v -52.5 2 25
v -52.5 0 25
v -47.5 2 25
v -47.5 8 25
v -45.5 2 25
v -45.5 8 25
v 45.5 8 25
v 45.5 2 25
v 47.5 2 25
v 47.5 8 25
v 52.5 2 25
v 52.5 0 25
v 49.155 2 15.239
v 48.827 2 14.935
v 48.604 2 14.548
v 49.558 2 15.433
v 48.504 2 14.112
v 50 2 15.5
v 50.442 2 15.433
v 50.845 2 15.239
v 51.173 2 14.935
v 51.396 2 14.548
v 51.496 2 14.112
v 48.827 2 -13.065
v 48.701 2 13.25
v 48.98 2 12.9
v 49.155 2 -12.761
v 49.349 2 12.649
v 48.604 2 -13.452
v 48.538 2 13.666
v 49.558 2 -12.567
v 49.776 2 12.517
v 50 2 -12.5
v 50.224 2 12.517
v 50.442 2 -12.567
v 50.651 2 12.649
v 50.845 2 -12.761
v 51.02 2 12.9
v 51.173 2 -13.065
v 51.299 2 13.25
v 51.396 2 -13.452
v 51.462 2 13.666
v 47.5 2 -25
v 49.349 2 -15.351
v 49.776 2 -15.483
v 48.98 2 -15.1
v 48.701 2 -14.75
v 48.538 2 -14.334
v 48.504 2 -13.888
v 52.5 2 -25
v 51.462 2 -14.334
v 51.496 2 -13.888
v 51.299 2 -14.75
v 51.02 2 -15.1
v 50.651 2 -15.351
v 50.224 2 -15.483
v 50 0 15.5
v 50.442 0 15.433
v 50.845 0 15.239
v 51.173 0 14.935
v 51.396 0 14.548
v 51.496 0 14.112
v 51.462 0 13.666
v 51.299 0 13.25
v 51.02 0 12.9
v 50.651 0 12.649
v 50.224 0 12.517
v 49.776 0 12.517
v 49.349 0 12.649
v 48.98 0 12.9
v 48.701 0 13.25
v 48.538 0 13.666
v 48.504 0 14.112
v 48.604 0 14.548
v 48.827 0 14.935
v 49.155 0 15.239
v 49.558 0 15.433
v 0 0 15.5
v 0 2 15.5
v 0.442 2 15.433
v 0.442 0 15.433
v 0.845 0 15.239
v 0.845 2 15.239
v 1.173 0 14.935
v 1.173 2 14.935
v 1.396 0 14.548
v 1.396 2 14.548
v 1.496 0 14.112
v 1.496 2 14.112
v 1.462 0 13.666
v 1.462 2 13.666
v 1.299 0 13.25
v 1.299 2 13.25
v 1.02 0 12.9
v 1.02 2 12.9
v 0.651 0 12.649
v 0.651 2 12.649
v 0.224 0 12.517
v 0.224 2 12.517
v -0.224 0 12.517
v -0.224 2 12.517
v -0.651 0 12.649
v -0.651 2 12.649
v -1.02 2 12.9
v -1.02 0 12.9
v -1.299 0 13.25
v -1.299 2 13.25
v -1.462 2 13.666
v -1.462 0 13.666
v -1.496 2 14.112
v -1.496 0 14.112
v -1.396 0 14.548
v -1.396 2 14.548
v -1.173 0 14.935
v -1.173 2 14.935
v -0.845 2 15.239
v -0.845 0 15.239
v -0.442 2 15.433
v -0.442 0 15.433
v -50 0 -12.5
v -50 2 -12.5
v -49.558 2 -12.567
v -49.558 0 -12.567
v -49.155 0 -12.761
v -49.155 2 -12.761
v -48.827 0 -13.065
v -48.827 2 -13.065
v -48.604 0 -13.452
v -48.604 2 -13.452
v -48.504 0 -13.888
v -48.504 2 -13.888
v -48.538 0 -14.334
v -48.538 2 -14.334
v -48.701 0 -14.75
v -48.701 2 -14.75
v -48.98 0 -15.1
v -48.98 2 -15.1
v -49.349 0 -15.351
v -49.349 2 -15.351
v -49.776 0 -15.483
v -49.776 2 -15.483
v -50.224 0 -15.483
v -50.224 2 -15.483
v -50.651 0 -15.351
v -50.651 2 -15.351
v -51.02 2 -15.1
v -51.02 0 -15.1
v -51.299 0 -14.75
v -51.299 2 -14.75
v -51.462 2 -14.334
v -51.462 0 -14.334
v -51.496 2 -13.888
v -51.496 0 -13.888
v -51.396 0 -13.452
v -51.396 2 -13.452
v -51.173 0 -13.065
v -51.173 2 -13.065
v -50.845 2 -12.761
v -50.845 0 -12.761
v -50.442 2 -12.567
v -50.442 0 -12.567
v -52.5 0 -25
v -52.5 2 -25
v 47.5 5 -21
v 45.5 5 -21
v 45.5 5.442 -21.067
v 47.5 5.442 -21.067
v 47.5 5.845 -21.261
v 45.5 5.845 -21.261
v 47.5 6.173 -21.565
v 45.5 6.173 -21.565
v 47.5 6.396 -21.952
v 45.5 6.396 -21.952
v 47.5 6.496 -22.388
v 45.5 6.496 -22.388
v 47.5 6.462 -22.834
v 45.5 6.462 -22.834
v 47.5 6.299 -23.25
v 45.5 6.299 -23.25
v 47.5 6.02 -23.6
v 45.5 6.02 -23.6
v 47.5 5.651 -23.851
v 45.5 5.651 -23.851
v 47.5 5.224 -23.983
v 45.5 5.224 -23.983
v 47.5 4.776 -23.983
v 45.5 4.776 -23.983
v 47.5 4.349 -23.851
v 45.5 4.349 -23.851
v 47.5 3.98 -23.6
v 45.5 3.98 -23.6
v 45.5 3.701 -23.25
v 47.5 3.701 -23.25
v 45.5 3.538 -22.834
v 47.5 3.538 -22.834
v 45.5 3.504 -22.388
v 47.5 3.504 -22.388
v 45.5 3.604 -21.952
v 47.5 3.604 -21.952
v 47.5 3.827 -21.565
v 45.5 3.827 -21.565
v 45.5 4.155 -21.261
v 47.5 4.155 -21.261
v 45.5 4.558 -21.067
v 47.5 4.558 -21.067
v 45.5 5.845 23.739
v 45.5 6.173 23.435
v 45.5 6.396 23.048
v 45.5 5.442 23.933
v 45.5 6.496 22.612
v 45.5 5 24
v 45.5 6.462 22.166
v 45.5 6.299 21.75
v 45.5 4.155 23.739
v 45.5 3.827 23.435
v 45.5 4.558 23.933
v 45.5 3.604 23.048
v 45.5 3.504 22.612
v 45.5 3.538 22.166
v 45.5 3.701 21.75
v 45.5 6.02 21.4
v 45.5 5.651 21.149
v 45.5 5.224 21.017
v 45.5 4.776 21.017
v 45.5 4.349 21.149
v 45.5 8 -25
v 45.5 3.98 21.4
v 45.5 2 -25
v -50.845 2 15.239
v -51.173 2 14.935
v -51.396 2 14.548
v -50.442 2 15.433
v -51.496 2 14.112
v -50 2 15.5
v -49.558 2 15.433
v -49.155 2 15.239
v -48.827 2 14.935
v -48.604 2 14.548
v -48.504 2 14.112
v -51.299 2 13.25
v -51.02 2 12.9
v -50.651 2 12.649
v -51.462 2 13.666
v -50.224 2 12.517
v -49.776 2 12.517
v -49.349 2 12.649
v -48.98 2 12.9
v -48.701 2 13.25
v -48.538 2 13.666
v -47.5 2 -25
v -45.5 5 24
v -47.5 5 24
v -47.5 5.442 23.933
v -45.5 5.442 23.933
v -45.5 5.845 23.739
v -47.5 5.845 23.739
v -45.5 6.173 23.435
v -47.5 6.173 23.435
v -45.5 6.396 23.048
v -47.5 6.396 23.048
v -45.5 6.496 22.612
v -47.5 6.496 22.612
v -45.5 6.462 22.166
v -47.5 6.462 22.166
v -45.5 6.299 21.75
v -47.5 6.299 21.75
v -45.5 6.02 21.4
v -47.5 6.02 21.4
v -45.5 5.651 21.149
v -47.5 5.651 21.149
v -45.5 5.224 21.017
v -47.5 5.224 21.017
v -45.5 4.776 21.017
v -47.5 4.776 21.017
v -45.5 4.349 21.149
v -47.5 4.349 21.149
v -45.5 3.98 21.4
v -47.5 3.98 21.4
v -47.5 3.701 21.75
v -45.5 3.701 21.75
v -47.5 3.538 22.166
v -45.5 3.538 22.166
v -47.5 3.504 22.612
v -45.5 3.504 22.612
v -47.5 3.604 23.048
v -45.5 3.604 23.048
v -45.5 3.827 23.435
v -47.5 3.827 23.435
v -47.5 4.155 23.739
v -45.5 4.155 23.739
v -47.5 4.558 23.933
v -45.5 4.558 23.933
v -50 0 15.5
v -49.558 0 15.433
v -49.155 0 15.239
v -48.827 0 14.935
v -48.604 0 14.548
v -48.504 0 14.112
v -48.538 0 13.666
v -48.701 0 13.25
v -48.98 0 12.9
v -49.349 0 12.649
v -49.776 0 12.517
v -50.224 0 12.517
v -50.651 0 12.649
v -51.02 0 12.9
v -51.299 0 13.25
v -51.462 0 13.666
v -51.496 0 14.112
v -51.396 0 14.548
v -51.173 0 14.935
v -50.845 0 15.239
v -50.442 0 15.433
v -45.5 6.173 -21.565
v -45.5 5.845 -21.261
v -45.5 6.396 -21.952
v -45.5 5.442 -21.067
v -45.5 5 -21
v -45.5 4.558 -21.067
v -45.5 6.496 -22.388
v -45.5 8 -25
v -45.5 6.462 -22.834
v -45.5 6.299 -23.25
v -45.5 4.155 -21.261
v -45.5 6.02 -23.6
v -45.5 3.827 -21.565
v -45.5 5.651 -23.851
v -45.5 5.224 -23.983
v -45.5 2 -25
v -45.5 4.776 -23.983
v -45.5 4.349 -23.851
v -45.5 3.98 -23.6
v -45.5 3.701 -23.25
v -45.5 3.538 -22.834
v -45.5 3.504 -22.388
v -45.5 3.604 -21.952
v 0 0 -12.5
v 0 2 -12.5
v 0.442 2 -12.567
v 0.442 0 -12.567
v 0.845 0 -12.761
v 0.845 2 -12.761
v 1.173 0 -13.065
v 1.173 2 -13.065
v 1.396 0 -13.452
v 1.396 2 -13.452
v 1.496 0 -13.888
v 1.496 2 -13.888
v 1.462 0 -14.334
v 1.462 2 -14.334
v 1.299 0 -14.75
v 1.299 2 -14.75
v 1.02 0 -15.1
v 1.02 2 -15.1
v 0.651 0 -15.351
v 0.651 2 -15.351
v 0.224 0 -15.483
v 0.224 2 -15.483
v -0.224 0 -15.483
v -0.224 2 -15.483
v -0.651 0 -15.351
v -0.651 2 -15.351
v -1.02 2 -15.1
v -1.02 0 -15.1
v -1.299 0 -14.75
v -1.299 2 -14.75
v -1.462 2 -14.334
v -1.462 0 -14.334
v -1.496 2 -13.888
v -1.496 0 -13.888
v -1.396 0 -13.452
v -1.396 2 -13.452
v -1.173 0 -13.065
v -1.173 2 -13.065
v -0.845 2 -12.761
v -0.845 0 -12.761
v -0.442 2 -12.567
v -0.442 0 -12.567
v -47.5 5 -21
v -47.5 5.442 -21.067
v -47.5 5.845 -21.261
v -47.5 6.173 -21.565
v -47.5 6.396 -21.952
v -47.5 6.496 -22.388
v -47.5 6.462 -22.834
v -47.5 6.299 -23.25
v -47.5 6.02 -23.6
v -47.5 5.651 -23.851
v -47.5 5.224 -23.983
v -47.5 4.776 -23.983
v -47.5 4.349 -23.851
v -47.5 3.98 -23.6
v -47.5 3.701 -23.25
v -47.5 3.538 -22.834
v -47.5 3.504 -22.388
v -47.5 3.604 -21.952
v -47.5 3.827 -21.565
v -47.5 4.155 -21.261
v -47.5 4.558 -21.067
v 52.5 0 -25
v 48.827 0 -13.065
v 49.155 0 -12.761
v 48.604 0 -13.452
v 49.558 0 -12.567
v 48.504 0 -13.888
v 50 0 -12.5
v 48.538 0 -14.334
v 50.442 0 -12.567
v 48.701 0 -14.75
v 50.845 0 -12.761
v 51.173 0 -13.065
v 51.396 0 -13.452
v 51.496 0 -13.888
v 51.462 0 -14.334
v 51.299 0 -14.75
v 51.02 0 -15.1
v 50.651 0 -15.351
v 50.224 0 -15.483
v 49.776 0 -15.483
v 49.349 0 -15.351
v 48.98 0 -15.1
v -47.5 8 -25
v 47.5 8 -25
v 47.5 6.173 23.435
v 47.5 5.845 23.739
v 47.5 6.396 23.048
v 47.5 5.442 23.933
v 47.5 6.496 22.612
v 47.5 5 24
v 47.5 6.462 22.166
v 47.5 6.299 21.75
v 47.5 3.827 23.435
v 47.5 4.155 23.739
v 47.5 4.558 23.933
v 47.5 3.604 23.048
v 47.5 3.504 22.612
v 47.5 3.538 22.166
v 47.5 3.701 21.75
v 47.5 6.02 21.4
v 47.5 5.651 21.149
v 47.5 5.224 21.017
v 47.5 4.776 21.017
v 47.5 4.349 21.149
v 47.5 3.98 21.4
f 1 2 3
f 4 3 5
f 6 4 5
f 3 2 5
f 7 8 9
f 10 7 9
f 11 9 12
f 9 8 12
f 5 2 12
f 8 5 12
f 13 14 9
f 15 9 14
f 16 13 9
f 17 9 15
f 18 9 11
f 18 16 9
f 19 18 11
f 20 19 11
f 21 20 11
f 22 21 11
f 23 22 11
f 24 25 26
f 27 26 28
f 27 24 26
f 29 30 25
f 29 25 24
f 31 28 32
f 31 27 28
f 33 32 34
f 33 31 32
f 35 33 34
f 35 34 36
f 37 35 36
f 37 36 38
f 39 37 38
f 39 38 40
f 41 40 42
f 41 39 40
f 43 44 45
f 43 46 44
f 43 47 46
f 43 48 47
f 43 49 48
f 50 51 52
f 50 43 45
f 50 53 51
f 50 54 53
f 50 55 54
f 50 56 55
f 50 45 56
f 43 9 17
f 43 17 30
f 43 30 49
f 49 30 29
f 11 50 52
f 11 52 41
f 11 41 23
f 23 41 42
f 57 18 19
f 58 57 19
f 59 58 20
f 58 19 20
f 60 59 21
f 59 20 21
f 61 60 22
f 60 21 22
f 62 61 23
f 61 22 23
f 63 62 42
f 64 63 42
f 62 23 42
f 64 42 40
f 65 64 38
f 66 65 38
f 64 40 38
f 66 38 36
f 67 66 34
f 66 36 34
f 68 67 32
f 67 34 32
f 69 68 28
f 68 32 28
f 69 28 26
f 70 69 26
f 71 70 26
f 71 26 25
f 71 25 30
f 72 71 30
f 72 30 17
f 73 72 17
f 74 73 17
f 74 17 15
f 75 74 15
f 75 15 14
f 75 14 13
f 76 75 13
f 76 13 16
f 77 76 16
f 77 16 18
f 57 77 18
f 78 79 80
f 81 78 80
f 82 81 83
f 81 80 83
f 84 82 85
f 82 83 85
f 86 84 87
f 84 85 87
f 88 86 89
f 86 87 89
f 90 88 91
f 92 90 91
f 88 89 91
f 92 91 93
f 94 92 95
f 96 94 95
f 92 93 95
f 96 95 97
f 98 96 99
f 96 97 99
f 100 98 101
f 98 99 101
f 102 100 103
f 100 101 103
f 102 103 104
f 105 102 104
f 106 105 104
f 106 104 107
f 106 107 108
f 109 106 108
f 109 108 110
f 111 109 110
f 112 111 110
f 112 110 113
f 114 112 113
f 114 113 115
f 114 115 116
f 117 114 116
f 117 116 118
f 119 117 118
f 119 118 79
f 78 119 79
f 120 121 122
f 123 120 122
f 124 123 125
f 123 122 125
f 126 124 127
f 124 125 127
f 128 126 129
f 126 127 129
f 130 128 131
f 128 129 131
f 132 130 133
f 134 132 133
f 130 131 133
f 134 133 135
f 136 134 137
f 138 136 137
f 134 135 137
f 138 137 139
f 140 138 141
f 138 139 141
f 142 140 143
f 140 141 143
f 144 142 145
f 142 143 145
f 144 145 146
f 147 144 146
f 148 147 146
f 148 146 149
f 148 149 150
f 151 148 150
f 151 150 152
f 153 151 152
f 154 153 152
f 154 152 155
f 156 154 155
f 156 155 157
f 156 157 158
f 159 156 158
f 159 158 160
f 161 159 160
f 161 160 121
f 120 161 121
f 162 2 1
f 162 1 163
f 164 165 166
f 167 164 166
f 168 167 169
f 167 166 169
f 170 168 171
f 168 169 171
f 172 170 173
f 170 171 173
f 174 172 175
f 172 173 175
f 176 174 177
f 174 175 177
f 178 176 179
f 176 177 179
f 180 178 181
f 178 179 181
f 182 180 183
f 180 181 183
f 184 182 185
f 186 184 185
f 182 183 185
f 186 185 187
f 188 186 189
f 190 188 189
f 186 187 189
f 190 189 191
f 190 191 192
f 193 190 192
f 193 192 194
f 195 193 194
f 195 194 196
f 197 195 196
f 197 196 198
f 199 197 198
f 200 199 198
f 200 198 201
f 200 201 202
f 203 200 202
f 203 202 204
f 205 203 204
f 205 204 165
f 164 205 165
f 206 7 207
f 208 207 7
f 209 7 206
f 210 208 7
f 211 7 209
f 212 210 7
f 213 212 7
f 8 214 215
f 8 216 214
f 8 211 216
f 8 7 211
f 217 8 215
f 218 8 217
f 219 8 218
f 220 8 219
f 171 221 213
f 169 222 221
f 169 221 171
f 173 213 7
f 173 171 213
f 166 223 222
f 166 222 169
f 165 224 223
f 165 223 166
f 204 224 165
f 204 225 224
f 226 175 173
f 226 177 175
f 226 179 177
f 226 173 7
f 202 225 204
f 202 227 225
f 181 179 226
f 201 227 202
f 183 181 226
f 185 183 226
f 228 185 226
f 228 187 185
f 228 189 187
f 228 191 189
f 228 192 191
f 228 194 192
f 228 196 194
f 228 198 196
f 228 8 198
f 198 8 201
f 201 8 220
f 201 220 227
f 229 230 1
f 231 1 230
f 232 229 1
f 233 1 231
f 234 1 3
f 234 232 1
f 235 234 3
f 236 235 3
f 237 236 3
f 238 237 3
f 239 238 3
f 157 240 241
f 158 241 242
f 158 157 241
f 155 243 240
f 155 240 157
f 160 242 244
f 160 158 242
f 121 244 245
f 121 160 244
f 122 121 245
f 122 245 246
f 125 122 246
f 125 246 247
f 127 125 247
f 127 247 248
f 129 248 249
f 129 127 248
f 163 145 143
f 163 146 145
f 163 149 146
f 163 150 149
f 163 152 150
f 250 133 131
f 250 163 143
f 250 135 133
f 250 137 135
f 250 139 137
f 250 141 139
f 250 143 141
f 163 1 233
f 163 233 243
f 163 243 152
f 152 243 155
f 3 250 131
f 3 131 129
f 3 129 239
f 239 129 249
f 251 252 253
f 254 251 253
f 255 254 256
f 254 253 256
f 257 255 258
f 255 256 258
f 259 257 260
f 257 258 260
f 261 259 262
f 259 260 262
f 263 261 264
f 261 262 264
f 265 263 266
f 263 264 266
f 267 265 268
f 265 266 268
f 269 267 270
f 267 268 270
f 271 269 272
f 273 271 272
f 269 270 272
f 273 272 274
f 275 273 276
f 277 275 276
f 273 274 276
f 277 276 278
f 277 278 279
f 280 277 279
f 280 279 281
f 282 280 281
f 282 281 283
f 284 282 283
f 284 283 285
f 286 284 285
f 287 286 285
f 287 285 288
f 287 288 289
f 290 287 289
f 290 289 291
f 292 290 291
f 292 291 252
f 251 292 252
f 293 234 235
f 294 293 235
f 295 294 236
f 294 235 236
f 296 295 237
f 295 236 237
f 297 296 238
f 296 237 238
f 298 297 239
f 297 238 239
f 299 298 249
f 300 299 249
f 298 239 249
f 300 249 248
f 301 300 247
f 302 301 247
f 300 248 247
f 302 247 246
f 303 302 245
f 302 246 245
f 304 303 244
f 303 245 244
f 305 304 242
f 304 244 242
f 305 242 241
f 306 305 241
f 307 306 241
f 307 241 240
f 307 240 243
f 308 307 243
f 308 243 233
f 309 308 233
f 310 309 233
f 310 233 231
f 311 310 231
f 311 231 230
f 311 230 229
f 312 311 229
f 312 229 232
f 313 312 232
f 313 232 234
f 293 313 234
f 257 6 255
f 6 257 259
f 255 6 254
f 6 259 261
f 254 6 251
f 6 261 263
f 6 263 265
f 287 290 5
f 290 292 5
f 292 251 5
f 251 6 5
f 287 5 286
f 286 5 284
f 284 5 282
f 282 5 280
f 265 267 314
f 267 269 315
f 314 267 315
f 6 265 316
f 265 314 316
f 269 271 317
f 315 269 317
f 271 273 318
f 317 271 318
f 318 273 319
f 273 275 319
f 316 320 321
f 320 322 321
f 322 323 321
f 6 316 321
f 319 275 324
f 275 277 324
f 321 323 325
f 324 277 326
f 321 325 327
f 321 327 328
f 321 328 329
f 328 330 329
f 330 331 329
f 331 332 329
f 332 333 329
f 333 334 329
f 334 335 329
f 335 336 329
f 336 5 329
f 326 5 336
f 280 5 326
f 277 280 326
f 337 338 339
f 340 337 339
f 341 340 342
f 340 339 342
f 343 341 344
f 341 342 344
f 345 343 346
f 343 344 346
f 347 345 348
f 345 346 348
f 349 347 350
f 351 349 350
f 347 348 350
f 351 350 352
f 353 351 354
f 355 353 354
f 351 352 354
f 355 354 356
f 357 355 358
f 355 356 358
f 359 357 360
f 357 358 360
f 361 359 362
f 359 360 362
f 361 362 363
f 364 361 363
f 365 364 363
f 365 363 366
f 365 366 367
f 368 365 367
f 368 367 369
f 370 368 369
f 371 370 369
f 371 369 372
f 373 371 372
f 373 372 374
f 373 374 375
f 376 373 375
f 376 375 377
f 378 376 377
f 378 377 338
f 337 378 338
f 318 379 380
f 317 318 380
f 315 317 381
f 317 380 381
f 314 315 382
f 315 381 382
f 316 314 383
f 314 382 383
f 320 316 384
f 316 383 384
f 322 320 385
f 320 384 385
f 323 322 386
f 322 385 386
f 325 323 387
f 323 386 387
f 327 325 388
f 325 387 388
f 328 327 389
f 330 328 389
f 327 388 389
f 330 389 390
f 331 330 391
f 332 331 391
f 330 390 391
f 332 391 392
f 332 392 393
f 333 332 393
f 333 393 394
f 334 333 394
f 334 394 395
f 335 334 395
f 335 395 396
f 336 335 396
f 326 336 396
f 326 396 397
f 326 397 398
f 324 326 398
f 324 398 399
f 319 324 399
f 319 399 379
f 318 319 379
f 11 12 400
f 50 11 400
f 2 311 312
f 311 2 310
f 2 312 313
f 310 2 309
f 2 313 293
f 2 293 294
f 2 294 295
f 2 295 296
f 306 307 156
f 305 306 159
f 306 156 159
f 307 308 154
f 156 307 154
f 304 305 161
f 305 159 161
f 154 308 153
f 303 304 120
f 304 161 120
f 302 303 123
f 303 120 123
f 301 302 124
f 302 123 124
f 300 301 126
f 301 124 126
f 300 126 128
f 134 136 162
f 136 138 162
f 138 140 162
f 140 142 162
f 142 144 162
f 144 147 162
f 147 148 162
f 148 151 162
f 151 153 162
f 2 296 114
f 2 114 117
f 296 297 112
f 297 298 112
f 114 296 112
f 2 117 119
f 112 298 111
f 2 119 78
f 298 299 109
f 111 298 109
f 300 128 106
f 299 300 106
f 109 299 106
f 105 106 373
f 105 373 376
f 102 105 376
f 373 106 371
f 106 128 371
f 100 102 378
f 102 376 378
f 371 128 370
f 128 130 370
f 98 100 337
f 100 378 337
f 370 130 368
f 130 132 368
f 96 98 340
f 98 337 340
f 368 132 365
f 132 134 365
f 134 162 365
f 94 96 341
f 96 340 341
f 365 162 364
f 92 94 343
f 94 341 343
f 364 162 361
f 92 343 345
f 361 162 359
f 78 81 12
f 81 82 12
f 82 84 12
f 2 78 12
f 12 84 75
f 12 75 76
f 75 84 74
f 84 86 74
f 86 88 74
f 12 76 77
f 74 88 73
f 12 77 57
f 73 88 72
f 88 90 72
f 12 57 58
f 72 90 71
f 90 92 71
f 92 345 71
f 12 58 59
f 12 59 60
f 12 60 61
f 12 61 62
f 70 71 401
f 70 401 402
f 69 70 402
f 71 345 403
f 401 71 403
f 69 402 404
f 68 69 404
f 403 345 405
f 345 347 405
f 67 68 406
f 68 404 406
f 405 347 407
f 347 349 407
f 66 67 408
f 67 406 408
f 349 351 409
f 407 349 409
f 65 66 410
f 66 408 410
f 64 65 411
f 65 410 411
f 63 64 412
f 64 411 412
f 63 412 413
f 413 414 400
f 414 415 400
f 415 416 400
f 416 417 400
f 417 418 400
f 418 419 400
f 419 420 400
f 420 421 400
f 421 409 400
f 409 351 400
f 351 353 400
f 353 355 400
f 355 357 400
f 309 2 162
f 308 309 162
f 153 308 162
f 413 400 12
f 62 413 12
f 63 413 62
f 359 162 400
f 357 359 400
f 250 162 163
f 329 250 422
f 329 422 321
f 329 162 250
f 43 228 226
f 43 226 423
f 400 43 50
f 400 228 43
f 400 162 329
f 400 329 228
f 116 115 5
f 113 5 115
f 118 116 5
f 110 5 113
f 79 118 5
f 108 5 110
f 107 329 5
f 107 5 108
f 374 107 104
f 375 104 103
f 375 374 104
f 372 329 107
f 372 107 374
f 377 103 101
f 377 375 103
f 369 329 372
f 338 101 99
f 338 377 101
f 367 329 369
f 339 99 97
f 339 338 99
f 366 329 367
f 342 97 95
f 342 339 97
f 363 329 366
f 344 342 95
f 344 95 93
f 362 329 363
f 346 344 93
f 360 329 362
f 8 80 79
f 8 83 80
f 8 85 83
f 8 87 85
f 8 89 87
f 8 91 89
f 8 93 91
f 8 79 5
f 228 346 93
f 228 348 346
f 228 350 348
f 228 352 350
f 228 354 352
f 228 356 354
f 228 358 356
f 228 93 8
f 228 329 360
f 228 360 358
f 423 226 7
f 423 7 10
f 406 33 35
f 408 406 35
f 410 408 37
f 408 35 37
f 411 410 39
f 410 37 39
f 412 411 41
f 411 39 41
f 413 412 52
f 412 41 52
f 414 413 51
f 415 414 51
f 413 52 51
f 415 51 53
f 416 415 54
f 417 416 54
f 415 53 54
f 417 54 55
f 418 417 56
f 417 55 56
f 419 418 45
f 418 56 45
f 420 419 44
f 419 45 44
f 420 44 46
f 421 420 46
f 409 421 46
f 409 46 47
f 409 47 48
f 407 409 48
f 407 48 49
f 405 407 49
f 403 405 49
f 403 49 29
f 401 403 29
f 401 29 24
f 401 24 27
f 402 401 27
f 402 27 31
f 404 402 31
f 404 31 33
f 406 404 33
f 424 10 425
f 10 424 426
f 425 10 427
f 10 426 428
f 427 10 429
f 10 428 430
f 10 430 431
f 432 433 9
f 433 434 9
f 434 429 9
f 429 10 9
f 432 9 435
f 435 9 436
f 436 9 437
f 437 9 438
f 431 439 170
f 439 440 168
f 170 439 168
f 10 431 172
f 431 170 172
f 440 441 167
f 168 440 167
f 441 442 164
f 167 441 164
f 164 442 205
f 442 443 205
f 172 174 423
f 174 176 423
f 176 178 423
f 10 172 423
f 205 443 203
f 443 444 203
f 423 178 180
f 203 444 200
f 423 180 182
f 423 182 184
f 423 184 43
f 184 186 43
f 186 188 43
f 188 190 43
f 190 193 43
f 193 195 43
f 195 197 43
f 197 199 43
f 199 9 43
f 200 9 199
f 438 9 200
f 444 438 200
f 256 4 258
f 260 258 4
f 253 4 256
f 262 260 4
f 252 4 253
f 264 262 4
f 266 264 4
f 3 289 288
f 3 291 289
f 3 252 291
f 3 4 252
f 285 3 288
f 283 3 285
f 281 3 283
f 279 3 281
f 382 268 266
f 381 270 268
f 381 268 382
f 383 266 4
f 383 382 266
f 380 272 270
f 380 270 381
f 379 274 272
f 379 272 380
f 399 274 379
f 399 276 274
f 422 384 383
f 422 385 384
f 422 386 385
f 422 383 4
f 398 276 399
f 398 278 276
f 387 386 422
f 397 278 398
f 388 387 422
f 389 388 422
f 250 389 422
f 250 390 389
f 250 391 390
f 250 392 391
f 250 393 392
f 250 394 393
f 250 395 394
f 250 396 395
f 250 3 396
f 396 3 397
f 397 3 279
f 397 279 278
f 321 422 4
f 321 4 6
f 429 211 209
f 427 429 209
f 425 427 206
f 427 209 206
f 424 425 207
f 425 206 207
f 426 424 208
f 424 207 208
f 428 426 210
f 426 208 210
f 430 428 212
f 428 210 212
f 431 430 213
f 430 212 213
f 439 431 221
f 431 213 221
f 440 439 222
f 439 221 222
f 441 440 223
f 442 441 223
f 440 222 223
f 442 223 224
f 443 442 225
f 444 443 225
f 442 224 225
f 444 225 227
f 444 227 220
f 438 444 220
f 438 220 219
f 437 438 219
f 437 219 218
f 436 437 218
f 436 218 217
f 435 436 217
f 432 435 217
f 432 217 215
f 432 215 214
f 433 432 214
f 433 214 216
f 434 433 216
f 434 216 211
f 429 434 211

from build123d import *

# Parameters (mm, degrees)
SKETCH_1_W          = 105
SKETCH_1_H          = 50
EXTRUDE_1_DEPTH     = 2
SKETCH_6_W          = 2
SKETCH_6_H          = 50
EXTRUDE_3_DEPTH     = 6
SKETCH_7_R          = 1.5
CUT_EXTRUDE_3_DEPTH = 6
SKETCH_8_R          = 1.5
CUT_EXTRUDE_4_DEPTH = 100


with BuildPart() as part:
    # 草图1 → 凸台-拉伸1 (new body)
    with BuildSketch(Plane(origin=(0, 0, 0), x_dir=(1, 0, 0), z_dir=(0, 1, 0))):
        Rectangle(SKETCH_1_W, SKETCH_1_H)
    extrude(amount=EXTRUDE_1_DEPTH)

    # 草图6 → 凸台-拉伸3 (add)
    with BuildSketch(Plane(origin=(0, 2, 0), x_dir=(1, 0, 0), z_dir=(0, 1, 0))):
        with Locations((-46.5, 0)):
            Rectangle(SKETCH_6_W, SKETCH_6_H)
        with Locations((46.5, 0)):
            Rectangle(SKETCH_6_W, SKETCH_6_H)
    extrude(amount=EXTRUDE_3_DEPTH)

    # 草图7 → 切除-拉伸3 (cut)
    with BuildSketch(Plane(origin=(0, 2, 0), x_dir=(1, 0, 0), z_dir=(0, 1, 0))):
        with Locations(Location((-50, 14, 0), (0, 0, 270))):
            Circle(SKETCH_7_R)
        with Locations(Location((-50, -14, 0), (0, 0, 270))):
            Circle(SKETCH_7_R)
        with Locations(Location((50, 14, 0), (0, 0, 270))):
            Circle(SKETCH_7_R)
        with Locations(Location((50, -14, 0), (0, 0, 270))):
            Circle(SKETCH_7_R)
        with Locations(Location((0, 14, 0), (0, 0, 270))):
            Circle(SKETCH_7_R)
        with Locations(Location((0, -14, 0), (0, 0, 270))):
            Circle(SKETCH_7_R)
    extrude(amount=-CUT_EXTRUDE_3_DEPTH, mode=Mode.SUBTRACT)

    # 草图8 → 切除-拉伸4 (cut)
    with BuildSketch(Plane.ZY.offset(47.5)):
        with Locations((-22.5, 5)):
            Circle(SKETCH_8_R)
        with Locations((22.5, 5)):
            Circle(SKETCH_8_R)
    extrude(amount=-CUT_EXTRUDE_4_DEPTH, mode=Mode.SUBTRACT)


solid = part.part
